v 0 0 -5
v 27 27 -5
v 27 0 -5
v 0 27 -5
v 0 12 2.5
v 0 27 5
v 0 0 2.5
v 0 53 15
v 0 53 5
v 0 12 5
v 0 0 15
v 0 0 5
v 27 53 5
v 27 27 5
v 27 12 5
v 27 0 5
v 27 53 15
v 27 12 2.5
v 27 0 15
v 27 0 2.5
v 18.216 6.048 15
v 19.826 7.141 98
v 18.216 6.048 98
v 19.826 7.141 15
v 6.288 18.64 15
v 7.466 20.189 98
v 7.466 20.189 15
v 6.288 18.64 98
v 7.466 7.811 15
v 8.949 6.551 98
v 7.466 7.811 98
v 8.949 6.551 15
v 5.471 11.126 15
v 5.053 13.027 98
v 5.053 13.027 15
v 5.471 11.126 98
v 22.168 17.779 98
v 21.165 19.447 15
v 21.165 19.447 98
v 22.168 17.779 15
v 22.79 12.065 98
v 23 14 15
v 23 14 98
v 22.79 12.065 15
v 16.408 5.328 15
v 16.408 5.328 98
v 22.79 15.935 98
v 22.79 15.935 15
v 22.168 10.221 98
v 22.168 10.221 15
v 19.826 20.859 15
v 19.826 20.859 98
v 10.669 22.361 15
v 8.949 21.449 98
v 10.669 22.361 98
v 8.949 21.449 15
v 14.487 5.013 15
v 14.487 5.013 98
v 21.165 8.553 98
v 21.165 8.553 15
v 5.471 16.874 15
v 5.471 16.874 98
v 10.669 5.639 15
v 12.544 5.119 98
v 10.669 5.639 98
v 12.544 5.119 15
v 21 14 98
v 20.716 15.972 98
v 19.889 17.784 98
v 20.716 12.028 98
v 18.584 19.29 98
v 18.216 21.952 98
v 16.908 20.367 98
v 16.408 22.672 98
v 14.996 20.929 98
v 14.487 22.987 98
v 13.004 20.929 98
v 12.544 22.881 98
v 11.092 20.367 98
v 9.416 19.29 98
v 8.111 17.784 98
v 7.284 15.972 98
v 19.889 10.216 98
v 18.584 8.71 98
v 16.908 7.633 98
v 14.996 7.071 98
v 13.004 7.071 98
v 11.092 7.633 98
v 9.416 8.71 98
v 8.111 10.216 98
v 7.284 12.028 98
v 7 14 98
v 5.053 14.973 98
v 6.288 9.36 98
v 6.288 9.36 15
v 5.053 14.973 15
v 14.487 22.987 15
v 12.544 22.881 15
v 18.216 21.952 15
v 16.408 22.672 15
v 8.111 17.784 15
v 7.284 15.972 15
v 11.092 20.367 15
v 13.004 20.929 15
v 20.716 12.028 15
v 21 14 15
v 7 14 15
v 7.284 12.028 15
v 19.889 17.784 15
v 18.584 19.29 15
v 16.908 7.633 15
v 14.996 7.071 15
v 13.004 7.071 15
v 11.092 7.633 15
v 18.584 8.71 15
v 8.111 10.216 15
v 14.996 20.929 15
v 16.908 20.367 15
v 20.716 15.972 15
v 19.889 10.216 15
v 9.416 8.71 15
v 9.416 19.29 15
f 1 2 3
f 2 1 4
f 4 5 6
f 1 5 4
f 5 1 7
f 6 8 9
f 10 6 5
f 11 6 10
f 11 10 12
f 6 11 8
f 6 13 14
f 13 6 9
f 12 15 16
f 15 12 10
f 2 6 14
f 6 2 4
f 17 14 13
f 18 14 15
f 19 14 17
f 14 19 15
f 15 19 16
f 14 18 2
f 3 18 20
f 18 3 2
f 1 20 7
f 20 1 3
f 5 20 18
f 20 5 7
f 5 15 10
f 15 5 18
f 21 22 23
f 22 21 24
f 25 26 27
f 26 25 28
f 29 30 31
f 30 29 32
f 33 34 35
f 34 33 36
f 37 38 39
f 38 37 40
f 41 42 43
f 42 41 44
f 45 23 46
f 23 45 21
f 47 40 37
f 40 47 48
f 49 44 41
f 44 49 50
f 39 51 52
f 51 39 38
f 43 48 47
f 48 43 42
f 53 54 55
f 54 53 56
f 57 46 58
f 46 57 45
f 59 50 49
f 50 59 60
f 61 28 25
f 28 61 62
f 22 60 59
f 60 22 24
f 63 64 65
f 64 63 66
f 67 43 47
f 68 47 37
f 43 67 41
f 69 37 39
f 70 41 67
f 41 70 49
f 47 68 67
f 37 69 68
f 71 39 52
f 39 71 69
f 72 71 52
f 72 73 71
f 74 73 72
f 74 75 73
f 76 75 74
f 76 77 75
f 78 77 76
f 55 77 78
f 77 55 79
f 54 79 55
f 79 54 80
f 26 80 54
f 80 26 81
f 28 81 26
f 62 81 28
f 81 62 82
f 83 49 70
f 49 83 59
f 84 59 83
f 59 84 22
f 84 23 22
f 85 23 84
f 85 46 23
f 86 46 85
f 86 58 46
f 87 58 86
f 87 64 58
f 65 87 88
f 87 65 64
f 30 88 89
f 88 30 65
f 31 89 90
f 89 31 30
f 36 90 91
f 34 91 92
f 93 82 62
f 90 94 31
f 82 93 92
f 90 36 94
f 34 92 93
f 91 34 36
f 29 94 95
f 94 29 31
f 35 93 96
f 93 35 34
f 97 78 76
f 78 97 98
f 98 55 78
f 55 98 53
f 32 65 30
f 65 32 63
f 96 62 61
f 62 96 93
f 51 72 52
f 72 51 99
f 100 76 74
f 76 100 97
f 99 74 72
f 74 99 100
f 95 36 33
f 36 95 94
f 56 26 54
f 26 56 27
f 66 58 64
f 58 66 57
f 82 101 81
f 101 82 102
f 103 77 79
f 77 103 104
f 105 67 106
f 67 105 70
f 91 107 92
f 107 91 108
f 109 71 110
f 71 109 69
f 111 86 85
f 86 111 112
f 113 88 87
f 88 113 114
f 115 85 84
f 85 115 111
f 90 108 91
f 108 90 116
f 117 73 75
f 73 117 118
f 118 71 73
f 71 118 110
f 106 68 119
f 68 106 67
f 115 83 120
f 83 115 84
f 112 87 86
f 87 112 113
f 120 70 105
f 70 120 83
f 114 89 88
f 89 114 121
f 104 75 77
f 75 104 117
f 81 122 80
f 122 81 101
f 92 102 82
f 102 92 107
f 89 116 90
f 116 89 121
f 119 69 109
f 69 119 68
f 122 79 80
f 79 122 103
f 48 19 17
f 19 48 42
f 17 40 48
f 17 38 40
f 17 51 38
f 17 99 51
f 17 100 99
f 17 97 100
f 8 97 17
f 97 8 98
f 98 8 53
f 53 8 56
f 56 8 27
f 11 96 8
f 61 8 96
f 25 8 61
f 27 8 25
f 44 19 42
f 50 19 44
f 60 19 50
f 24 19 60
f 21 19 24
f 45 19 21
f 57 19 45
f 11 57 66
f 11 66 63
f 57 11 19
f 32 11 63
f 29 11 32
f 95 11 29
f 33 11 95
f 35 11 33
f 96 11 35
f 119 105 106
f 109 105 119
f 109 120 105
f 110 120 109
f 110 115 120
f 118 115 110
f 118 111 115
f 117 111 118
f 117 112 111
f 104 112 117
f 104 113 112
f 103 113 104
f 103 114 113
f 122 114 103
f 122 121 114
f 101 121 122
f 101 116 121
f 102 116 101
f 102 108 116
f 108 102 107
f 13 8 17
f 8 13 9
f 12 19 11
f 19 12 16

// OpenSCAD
difference ()
{

linear_extrude(height =10,center = true) square([27,27]);
    
 translate([0,-15,4])    
linear_extrude(height =3,center = true) square([27,27]);
}

translate ([0,0,10]) 
linear_extrude(height =10,center = true) square([27,53]);

translate([14,14,10]){
difference() {
linear_extrude(88) circle(9); 
linear_extrude(88) circle(7);
}
}
